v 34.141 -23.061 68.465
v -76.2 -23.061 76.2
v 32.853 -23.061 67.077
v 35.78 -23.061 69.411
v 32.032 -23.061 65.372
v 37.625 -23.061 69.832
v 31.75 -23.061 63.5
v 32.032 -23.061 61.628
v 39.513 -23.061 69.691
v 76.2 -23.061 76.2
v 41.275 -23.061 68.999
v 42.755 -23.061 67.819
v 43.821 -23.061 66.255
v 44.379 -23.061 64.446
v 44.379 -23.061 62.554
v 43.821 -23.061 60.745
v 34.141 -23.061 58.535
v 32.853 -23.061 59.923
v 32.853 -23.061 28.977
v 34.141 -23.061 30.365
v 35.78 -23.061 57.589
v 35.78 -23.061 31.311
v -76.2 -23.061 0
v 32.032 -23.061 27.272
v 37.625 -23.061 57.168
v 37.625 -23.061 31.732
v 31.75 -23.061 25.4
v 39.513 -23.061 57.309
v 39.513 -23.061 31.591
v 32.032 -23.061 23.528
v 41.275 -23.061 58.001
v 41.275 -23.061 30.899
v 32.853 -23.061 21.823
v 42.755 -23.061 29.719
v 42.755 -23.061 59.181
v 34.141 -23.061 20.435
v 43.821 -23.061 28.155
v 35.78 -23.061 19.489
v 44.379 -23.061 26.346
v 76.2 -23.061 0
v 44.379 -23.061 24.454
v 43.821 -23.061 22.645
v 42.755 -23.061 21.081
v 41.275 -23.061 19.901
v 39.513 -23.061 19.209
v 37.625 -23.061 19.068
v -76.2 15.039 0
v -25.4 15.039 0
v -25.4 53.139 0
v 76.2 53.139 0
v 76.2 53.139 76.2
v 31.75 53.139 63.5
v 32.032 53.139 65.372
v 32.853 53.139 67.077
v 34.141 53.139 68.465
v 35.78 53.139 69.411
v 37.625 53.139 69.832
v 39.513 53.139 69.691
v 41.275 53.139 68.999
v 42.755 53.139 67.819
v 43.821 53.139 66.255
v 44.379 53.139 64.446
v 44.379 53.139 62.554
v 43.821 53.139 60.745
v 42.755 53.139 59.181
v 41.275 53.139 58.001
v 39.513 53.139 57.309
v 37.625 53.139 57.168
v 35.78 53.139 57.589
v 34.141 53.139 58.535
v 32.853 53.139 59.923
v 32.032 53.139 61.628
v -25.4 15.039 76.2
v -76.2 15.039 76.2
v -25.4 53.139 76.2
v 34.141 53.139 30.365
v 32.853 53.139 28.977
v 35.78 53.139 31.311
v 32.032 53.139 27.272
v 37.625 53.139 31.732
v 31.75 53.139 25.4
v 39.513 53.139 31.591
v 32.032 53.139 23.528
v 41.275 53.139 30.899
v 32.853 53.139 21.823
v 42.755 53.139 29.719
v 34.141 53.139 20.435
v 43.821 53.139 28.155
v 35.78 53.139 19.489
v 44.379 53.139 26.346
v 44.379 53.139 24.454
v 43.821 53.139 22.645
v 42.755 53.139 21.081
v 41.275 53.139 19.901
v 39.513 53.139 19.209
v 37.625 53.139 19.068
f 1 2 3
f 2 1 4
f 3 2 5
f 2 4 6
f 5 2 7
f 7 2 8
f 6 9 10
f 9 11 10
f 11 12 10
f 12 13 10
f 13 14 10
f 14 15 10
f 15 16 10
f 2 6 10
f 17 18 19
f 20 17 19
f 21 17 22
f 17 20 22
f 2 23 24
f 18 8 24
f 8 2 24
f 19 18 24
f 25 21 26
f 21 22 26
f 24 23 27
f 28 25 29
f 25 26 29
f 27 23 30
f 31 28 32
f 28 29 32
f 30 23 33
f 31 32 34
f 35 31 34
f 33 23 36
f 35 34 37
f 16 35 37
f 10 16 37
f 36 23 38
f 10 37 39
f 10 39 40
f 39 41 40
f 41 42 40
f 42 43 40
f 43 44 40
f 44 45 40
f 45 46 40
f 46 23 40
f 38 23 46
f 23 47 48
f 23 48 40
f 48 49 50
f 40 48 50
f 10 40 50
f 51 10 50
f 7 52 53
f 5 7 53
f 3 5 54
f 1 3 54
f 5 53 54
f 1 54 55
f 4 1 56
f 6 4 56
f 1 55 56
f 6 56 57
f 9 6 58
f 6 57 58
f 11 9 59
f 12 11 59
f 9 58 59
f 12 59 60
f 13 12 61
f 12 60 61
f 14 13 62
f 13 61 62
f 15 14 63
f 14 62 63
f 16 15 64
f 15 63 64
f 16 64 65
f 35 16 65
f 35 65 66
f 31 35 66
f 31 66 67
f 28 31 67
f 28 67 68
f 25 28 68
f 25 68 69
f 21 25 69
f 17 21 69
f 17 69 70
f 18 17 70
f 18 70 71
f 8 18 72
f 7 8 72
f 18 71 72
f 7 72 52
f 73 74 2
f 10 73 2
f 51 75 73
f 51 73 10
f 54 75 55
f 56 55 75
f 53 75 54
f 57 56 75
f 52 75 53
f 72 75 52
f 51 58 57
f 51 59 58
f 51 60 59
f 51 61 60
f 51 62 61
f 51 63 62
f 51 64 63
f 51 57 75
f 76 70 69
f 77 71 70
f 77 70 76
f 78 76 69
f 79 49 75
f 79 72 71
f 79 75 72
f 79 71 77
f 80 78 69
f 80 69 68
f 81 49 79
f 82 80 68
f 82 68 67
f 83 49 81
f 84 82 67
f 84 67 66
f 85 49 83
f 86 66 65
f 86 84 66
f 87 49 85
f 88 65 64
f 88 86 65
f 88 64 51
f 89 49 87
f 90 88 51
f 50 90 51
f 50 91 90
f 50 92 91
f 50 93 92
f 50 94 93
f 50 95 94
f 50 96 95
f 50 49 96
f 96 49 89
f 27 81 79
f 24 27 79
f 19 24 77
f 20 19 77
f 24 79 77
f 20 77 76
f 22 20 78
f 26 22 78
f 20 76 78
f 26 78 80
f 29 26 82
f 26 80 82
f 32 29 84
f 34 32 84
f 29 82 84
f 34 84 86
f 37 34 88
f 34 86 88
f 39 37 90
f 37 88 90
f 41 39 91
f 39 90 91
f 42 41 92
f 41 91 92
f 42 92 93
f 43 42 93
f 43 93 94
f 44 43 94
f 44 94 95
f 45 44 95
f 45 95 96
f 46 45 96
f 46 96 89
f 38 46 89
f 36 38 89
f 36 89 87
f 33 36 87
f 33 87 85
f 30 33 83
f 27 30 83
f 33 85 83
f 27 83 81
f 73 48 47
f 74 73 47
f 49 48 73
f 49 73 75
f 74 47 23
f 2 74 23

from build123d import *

# Parameters (mm, degrees)
F0_W     = 101.6
F0_H     = 38.1
F1_DEPTH = 76.2
F2_R     = 6.35
F3_DEPTH = 76.2


with BuildPart() as f1:
    # F0 (on Top) → F1 (new body)
    with BuildSketch(Plane.XY):
        Polygon((76.2, -23.060526), (76.2, 15.039474), (-25.4, 15.039474), (-76.2, 15.039474), (-76.2, -23.060526), align=None)
        with Locations((25.4, 34.089474)):
            Rectangle(F0_W, F0_H)
    extrude(amount=F1_DEPTH)

    # F2 (on face) → F3 (cut)
    with BuildSketch(Plane(origin=(0, 53.139474, 0), x_dir=(-1, 0, 0), z_dir=(0, 1, 0))):
        with Locations((-38.1, 25.4)):
            Circle(F2_R)
        with Locations((-38.1, 63.5)):
            Circle(F2_R)
    extrude(amount=-F3_DEPTH, mode=Mode.SUBTRACT)


solid = f1.part
